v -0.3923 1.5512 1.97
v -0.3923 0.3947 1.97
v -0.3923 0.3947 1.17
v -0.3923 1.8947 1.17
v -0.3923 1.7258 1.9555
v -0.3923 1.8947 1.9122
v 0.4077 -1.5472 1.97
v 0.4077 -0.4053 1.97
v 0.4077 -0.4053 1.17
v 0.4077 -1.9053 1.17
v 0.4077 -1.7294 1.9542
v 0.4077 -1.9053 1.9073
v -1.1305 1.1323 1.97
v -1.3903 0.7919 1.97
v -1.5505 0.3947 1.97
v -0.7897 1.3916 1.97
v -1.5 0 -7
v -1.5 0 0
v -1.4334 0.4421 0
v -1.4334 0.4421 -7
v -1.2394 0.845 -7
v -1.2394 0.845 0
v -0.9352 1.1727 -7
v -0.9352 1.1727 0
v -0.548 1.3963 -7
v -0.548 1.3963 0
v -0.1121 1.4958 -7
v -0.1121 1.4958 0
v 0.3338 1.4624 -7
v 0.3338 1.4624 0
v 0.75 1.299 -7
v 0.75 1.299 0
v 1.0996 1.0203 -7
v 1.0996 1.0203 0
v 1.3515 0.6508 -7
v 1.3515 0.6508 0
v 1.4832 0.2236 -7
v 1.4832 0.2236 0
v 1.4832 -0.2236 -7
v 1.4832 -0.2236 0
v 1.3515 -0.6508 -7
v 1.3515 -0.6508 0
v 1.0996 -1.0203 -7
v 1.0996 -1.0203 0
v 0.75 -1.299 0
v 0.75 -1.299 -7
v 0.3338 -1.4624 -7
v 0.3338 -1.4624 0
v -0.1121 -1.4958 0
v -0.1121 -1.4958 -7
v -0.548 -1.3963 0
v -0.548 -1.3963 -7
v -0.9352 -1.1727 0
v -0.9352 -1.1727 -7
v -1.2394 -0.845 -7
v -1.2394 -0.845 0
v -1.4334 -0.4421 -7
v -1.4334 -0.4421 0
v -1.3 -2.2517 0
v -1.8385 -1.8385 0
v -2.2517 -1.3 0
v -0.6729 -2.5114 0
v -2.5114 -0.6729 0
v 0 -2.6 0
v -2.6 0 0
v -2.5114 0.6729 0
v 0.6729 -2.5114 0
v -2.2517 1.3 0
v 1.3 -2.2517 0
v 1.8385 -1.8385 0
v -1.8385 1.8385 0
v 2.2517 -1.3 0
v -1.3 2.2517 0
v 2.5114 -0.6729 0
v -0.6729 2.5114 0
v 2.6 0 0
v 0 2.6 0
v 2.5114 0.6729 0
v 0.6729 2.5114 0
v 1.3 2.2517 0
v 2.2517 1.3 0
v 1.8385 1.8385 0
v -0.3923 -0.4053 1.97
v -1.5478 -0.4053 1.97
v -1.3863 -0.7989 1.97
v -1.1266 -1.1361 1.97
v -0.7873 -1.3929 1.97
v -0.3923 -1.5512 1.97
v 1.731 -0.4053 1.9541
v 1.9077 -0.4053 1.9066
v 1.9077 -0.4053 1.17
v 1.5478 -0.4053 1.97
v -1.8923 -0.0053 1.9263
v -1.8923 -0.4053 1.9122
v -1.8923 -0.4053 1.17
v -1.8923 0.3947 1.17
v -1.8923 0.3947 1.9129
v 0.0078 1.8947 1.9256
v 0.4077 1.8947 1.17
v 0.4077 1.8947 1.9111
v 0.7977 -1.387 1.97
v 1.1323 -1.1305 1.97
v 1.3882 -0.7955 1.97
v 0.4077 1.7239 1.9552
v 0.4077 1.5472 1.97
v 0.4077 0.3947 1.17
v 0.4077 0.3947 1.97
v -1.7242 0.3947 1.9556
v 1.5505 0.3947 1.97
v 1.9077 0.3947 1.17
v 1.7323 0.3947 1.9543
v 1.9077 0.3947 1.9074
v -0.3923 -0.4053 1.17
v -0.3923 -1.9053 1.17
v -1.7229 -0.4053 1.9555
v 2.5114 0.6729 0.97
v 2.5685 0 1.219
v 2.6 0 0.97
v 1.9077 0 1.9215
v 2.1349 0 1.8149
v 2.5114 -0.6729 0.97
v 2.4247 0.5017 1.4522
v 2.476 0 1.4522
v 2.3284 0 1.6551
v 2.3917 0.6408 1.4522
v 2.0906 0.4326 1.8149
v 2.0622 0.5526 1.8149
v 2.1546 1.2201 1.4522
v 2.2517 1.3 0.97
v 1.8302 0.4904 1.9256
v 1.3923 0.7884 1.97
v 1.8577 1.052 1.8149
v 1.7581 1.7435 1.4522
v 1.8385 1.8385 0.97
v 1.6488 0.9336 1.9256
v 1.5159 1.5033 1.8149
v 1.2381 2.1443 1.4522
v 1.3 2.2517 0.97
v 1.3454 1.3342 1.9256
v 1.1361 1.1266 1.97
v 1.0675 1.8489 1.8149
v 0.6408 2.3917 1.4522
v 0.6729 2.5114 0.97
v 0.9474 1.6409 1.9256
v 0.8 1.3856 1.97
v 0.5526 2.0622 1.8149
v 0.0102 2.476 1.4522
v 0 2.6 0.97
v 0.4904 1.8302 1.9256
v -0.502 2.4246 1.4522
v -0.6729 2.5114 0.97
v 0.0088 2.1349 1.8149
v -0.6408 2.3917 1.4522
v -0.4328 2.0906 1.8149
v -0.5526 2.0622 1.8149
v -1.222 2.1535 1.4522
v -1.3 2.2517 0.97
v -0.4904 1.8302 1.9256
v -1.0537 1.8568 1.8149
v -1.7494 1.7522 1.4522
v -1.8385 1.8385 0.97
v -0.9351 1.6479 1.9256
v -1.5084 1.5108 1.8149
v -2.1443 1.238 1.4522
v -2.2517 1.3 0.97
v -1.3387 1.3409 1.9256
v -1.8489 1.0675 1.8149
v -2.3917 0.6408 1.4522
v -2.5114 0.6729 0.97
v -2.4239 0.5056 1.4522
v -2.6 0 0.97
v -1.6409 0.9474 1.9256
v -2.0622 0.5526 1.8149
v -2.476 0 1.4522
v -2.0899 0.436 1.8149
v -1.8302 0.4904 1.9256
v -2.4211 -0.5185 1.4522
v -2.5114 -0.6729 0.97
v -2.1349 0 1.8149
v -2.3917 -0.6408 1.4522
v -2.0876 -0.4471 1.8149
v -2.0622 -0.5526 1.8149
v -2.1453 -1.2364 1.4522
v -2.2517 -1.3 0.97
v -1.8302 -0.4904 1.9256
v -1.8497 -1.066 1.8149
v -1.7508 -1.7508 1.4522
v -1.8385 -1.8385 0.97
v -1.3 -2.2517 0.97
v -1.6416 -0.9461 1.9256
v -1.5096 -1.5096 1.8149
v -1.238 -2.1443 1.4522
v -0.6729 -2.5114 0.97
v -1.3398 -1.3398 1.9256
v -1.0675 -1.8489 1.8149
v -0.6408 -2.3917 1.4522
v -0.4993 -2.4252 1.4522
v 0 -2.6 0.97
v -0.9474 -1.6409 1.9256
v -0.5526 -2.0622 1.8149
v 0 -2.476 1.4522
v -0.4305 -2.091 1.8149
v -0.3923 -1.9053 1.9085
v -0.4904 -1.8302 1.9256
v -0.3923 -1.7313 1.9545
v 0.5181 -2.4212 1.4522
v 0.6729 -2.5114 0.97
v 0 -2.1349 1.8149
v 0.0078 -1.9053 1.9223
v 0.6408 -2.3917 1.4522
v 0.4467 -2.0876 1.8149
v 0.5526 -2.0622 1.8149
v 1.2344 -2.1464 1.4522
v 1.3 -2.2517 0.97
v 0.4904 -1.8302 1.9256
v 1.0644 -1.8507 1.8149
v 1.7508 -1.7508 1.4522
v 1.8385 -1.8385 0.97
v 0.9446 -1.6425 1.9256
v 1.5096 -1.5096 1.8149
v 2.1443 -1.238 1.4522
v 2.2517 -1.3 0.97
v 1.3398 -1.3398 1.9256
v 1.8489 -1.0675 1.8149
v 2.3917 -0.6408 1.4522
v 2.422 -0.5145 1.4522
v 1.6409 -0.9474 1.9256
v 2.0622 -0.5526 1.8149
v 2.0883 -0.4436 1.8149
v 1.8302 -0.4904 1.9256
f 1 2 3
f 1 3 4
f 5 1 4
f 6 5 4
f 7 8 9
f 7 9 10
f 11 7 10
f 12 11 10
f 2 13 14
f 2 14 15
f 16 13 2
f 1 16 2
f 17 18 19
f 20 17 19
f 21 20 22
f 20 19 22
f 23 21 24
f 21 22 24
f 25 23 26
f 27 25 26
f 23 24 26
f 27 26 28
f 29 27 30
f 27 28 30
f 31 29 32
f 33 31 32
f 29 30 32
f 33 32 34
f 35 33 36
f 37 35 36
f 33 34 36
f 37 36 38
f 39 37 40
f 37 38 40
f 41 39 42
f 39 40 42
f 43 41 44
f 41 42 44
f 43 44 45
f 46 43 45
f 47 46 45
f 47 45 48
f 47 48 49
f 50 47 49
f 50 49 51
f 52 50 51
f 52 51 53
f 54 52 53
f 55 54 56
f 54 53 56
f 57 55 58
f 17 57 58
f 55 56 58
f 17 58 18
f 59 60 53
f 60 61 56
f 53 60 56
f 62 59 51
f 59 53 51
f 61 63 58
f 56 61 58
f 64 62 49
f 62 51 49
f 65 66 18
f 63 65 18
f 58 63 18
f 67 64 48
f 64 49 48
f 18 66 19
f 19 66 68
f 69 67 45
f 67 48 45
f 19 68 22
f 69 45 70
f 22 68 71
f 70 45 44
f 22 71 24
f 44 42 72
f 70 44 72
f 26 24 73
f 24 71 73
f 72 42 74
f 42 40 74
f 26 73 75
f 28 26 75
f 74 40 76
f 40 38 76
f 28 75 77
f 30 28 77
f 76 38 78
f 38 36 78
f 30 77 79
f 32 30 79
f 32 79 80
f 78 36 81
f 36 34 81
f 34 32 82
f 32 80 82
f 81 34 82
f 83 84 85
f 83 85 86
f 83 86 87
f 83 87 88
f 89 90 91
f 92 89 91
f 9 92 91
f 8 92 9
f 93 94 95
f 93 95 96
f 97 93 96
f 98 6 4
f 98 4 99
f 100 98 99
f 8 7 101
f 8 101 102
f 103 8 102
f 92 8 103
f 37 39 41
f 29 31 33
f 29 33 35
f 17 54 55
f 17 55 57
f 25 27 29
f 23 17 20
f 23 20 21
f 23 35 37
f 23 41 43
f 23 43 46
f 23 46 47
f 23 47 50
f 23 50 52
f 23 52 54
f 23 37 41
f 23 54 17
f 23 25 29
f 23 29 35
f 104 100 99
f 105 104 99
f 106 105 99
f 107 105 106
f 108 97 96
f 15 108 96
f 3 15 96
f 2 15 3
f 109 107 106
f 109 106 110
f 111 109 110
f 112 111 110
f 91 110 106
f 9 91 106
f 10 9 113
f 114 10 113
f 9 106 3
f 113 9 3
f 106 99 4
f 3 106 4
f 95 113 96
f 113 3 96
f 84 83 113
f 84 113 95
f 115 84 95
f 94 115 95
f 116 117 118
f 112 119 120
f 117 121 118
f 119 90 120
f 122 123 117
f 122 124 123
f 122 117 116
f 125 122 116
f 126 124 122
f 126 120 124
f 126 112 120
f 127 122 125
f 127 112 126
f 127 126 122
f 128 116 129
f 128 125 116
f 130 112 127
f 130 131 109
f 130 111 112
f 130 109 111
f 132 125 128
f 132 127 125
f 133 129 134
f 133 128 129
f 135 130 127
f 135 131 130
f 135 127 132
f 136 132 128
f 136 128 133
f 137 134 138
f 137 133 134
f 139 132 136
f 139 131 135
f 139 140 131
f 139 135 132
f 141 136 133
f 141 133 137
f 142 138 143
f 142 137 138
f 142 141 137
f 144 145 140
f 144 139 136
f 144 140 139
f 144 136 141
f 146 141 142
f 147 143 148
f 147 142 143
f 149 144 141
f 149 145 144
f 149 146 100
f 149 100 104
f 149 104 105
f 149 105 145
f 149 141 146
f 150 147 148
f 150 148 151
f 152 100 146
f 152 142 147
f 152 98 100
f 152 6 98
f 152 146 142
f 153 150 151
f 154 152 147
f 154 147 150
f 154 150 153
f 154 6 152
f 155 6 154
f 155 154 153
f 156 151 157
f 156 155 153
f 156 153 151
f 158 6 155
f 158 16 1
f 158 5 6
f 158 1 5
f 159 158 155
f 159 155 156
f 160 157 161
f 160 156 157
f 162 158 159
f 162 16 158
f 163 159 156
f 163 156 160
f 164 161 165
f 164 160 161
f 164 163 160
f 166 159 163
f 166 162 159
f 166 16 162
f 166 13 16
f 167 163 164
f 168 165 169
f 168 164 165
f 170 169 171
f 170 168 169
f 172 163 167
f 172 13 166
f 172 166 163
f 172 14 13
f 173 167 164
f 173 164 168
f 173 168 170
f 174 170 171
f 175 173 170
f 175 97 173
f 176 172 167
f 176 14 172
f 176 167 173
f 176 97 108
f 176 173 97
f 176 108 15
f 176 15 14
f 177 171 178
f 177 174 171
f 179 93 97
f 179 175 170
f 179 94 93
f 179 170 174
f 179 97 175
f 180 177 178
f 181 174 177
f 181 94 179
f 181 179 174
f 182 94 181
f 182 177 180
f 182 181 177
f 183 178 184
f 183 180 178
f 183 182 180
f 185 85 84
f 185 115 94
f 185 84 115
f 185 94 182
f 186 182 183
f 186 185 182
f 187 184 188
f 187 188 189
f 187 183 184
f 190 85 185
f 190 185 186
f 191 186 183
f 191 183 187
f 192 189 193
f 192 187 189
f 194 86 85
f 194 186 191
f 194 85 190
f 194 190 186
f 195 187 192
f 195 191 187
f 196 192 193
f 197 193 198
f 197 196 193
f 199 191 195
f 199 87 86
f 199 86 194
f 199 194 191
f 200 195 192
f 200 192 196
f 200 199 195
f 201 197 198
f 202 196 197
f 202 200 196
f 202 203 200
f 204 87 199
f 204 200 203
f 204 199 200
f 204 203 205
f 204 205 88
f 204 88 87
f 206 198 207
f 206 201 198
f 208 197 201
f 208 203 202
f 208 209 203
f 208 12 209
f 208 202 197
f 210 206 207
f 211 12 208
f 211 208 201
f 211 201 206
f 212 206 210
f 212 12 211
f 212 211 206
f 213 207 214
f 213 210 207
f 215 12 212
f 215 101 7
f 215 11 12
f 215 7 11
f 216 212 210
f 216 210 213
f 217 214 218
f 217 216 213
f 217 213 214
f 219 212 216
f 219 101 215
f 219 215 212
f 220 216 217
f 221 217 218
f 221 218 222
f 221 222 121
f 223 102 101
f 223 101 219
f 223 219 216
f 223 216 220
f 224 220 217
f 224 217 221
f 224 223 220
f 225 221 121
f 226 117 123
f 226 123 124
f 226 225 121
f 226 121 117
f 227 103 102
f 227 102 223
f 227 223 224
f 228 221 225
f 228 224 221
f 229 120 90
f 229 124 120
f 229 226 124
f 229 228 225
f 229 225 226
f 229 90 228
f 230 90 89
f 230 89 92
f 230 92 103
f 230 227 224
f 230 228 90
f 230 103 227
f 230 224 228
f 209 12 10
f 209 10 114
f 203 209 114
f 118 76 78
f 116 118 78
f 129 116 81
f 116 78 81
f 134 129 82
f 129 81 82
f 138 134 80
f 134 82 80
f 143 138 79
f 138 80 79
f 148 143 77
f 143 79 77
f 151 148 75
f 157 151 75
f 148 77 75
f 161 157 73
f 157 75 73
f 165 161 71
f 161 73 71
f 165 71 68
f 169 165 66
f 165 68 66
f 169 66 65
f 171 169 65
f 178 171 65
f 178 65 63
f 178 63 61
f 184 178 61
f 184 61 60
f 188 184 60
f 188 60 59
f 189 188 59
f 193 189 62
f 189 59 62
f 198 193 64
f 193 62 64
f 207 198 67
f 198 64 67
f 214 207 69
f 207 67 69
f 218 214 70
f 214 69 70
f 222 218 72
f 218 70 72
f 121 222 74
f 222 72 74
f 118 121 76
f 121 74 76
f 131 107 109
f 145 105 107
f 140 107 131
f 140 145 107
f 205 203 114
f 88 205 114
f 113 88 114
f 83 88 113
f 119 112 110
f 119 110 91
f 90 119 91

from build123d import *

# Parameters (mm, degrees)
SKETCH1_R           = 2.6
BOSS_EXTRUDE1_DEPTH = 1.97
SKETCH2_R           = 1.5
BOSS_EXTRUDE2_DEPTH = 7
FILLET1_R           = 1
CUT_EXTRUDE1_DEPTH  = 0.8


with BuildPart() as part:
    # Sketch1 → Boss-Extrude1 (new body)
    with BuildSketch(Plane.XY):
        Circle(SKETCH1_R)
    extrude(amount=BOSS_EXTRUDE1_DEPTH)

    # Sketch2 → Boss-Extrude2 (add)
    with BuildSketch(Plane(origin=(0, 0, 0), x_dir=(-1, 0, 0), z_dir=(0, 0, -1))):
        Circle(SKETCH2_R)
    extrude(amount=BOSS_EXTRUDE2_DEPTH)

    # Fillet1
    fillet1_edges = [part.edges().sort_by_distance(p)[0] for p in [
        (-2.6, 0, 1.97),
    ]]
    fillet(fillet1_edges, radius=FILLET1_R)

    # Sketch3 → Cut-Extrude1 (cut)
    with BuildSketch(Plane.XY.offset(1.97)):
        Polygon((-0.392282833, 0.394745479), (-0.392282833, 1.894745479), (0.407717167, 1.894745479), (0.407717167, 0.394745479), (1.907717167, 0.394745479), (1.907717167, -0.405254521), (0.407717167, -0.405254521), (0.407717167, -1.905254521), (-0.392282833, -1.905254521), (-0.392282833, -0.405254521), (-1.892282833, -0.405254521), (-1.892282833, 0.394745479), align=None)
    extrude(amount=-CUT_EXTRUDE1_DEPTH, mode=Mode.SUBTRACT)


solid = part.part
